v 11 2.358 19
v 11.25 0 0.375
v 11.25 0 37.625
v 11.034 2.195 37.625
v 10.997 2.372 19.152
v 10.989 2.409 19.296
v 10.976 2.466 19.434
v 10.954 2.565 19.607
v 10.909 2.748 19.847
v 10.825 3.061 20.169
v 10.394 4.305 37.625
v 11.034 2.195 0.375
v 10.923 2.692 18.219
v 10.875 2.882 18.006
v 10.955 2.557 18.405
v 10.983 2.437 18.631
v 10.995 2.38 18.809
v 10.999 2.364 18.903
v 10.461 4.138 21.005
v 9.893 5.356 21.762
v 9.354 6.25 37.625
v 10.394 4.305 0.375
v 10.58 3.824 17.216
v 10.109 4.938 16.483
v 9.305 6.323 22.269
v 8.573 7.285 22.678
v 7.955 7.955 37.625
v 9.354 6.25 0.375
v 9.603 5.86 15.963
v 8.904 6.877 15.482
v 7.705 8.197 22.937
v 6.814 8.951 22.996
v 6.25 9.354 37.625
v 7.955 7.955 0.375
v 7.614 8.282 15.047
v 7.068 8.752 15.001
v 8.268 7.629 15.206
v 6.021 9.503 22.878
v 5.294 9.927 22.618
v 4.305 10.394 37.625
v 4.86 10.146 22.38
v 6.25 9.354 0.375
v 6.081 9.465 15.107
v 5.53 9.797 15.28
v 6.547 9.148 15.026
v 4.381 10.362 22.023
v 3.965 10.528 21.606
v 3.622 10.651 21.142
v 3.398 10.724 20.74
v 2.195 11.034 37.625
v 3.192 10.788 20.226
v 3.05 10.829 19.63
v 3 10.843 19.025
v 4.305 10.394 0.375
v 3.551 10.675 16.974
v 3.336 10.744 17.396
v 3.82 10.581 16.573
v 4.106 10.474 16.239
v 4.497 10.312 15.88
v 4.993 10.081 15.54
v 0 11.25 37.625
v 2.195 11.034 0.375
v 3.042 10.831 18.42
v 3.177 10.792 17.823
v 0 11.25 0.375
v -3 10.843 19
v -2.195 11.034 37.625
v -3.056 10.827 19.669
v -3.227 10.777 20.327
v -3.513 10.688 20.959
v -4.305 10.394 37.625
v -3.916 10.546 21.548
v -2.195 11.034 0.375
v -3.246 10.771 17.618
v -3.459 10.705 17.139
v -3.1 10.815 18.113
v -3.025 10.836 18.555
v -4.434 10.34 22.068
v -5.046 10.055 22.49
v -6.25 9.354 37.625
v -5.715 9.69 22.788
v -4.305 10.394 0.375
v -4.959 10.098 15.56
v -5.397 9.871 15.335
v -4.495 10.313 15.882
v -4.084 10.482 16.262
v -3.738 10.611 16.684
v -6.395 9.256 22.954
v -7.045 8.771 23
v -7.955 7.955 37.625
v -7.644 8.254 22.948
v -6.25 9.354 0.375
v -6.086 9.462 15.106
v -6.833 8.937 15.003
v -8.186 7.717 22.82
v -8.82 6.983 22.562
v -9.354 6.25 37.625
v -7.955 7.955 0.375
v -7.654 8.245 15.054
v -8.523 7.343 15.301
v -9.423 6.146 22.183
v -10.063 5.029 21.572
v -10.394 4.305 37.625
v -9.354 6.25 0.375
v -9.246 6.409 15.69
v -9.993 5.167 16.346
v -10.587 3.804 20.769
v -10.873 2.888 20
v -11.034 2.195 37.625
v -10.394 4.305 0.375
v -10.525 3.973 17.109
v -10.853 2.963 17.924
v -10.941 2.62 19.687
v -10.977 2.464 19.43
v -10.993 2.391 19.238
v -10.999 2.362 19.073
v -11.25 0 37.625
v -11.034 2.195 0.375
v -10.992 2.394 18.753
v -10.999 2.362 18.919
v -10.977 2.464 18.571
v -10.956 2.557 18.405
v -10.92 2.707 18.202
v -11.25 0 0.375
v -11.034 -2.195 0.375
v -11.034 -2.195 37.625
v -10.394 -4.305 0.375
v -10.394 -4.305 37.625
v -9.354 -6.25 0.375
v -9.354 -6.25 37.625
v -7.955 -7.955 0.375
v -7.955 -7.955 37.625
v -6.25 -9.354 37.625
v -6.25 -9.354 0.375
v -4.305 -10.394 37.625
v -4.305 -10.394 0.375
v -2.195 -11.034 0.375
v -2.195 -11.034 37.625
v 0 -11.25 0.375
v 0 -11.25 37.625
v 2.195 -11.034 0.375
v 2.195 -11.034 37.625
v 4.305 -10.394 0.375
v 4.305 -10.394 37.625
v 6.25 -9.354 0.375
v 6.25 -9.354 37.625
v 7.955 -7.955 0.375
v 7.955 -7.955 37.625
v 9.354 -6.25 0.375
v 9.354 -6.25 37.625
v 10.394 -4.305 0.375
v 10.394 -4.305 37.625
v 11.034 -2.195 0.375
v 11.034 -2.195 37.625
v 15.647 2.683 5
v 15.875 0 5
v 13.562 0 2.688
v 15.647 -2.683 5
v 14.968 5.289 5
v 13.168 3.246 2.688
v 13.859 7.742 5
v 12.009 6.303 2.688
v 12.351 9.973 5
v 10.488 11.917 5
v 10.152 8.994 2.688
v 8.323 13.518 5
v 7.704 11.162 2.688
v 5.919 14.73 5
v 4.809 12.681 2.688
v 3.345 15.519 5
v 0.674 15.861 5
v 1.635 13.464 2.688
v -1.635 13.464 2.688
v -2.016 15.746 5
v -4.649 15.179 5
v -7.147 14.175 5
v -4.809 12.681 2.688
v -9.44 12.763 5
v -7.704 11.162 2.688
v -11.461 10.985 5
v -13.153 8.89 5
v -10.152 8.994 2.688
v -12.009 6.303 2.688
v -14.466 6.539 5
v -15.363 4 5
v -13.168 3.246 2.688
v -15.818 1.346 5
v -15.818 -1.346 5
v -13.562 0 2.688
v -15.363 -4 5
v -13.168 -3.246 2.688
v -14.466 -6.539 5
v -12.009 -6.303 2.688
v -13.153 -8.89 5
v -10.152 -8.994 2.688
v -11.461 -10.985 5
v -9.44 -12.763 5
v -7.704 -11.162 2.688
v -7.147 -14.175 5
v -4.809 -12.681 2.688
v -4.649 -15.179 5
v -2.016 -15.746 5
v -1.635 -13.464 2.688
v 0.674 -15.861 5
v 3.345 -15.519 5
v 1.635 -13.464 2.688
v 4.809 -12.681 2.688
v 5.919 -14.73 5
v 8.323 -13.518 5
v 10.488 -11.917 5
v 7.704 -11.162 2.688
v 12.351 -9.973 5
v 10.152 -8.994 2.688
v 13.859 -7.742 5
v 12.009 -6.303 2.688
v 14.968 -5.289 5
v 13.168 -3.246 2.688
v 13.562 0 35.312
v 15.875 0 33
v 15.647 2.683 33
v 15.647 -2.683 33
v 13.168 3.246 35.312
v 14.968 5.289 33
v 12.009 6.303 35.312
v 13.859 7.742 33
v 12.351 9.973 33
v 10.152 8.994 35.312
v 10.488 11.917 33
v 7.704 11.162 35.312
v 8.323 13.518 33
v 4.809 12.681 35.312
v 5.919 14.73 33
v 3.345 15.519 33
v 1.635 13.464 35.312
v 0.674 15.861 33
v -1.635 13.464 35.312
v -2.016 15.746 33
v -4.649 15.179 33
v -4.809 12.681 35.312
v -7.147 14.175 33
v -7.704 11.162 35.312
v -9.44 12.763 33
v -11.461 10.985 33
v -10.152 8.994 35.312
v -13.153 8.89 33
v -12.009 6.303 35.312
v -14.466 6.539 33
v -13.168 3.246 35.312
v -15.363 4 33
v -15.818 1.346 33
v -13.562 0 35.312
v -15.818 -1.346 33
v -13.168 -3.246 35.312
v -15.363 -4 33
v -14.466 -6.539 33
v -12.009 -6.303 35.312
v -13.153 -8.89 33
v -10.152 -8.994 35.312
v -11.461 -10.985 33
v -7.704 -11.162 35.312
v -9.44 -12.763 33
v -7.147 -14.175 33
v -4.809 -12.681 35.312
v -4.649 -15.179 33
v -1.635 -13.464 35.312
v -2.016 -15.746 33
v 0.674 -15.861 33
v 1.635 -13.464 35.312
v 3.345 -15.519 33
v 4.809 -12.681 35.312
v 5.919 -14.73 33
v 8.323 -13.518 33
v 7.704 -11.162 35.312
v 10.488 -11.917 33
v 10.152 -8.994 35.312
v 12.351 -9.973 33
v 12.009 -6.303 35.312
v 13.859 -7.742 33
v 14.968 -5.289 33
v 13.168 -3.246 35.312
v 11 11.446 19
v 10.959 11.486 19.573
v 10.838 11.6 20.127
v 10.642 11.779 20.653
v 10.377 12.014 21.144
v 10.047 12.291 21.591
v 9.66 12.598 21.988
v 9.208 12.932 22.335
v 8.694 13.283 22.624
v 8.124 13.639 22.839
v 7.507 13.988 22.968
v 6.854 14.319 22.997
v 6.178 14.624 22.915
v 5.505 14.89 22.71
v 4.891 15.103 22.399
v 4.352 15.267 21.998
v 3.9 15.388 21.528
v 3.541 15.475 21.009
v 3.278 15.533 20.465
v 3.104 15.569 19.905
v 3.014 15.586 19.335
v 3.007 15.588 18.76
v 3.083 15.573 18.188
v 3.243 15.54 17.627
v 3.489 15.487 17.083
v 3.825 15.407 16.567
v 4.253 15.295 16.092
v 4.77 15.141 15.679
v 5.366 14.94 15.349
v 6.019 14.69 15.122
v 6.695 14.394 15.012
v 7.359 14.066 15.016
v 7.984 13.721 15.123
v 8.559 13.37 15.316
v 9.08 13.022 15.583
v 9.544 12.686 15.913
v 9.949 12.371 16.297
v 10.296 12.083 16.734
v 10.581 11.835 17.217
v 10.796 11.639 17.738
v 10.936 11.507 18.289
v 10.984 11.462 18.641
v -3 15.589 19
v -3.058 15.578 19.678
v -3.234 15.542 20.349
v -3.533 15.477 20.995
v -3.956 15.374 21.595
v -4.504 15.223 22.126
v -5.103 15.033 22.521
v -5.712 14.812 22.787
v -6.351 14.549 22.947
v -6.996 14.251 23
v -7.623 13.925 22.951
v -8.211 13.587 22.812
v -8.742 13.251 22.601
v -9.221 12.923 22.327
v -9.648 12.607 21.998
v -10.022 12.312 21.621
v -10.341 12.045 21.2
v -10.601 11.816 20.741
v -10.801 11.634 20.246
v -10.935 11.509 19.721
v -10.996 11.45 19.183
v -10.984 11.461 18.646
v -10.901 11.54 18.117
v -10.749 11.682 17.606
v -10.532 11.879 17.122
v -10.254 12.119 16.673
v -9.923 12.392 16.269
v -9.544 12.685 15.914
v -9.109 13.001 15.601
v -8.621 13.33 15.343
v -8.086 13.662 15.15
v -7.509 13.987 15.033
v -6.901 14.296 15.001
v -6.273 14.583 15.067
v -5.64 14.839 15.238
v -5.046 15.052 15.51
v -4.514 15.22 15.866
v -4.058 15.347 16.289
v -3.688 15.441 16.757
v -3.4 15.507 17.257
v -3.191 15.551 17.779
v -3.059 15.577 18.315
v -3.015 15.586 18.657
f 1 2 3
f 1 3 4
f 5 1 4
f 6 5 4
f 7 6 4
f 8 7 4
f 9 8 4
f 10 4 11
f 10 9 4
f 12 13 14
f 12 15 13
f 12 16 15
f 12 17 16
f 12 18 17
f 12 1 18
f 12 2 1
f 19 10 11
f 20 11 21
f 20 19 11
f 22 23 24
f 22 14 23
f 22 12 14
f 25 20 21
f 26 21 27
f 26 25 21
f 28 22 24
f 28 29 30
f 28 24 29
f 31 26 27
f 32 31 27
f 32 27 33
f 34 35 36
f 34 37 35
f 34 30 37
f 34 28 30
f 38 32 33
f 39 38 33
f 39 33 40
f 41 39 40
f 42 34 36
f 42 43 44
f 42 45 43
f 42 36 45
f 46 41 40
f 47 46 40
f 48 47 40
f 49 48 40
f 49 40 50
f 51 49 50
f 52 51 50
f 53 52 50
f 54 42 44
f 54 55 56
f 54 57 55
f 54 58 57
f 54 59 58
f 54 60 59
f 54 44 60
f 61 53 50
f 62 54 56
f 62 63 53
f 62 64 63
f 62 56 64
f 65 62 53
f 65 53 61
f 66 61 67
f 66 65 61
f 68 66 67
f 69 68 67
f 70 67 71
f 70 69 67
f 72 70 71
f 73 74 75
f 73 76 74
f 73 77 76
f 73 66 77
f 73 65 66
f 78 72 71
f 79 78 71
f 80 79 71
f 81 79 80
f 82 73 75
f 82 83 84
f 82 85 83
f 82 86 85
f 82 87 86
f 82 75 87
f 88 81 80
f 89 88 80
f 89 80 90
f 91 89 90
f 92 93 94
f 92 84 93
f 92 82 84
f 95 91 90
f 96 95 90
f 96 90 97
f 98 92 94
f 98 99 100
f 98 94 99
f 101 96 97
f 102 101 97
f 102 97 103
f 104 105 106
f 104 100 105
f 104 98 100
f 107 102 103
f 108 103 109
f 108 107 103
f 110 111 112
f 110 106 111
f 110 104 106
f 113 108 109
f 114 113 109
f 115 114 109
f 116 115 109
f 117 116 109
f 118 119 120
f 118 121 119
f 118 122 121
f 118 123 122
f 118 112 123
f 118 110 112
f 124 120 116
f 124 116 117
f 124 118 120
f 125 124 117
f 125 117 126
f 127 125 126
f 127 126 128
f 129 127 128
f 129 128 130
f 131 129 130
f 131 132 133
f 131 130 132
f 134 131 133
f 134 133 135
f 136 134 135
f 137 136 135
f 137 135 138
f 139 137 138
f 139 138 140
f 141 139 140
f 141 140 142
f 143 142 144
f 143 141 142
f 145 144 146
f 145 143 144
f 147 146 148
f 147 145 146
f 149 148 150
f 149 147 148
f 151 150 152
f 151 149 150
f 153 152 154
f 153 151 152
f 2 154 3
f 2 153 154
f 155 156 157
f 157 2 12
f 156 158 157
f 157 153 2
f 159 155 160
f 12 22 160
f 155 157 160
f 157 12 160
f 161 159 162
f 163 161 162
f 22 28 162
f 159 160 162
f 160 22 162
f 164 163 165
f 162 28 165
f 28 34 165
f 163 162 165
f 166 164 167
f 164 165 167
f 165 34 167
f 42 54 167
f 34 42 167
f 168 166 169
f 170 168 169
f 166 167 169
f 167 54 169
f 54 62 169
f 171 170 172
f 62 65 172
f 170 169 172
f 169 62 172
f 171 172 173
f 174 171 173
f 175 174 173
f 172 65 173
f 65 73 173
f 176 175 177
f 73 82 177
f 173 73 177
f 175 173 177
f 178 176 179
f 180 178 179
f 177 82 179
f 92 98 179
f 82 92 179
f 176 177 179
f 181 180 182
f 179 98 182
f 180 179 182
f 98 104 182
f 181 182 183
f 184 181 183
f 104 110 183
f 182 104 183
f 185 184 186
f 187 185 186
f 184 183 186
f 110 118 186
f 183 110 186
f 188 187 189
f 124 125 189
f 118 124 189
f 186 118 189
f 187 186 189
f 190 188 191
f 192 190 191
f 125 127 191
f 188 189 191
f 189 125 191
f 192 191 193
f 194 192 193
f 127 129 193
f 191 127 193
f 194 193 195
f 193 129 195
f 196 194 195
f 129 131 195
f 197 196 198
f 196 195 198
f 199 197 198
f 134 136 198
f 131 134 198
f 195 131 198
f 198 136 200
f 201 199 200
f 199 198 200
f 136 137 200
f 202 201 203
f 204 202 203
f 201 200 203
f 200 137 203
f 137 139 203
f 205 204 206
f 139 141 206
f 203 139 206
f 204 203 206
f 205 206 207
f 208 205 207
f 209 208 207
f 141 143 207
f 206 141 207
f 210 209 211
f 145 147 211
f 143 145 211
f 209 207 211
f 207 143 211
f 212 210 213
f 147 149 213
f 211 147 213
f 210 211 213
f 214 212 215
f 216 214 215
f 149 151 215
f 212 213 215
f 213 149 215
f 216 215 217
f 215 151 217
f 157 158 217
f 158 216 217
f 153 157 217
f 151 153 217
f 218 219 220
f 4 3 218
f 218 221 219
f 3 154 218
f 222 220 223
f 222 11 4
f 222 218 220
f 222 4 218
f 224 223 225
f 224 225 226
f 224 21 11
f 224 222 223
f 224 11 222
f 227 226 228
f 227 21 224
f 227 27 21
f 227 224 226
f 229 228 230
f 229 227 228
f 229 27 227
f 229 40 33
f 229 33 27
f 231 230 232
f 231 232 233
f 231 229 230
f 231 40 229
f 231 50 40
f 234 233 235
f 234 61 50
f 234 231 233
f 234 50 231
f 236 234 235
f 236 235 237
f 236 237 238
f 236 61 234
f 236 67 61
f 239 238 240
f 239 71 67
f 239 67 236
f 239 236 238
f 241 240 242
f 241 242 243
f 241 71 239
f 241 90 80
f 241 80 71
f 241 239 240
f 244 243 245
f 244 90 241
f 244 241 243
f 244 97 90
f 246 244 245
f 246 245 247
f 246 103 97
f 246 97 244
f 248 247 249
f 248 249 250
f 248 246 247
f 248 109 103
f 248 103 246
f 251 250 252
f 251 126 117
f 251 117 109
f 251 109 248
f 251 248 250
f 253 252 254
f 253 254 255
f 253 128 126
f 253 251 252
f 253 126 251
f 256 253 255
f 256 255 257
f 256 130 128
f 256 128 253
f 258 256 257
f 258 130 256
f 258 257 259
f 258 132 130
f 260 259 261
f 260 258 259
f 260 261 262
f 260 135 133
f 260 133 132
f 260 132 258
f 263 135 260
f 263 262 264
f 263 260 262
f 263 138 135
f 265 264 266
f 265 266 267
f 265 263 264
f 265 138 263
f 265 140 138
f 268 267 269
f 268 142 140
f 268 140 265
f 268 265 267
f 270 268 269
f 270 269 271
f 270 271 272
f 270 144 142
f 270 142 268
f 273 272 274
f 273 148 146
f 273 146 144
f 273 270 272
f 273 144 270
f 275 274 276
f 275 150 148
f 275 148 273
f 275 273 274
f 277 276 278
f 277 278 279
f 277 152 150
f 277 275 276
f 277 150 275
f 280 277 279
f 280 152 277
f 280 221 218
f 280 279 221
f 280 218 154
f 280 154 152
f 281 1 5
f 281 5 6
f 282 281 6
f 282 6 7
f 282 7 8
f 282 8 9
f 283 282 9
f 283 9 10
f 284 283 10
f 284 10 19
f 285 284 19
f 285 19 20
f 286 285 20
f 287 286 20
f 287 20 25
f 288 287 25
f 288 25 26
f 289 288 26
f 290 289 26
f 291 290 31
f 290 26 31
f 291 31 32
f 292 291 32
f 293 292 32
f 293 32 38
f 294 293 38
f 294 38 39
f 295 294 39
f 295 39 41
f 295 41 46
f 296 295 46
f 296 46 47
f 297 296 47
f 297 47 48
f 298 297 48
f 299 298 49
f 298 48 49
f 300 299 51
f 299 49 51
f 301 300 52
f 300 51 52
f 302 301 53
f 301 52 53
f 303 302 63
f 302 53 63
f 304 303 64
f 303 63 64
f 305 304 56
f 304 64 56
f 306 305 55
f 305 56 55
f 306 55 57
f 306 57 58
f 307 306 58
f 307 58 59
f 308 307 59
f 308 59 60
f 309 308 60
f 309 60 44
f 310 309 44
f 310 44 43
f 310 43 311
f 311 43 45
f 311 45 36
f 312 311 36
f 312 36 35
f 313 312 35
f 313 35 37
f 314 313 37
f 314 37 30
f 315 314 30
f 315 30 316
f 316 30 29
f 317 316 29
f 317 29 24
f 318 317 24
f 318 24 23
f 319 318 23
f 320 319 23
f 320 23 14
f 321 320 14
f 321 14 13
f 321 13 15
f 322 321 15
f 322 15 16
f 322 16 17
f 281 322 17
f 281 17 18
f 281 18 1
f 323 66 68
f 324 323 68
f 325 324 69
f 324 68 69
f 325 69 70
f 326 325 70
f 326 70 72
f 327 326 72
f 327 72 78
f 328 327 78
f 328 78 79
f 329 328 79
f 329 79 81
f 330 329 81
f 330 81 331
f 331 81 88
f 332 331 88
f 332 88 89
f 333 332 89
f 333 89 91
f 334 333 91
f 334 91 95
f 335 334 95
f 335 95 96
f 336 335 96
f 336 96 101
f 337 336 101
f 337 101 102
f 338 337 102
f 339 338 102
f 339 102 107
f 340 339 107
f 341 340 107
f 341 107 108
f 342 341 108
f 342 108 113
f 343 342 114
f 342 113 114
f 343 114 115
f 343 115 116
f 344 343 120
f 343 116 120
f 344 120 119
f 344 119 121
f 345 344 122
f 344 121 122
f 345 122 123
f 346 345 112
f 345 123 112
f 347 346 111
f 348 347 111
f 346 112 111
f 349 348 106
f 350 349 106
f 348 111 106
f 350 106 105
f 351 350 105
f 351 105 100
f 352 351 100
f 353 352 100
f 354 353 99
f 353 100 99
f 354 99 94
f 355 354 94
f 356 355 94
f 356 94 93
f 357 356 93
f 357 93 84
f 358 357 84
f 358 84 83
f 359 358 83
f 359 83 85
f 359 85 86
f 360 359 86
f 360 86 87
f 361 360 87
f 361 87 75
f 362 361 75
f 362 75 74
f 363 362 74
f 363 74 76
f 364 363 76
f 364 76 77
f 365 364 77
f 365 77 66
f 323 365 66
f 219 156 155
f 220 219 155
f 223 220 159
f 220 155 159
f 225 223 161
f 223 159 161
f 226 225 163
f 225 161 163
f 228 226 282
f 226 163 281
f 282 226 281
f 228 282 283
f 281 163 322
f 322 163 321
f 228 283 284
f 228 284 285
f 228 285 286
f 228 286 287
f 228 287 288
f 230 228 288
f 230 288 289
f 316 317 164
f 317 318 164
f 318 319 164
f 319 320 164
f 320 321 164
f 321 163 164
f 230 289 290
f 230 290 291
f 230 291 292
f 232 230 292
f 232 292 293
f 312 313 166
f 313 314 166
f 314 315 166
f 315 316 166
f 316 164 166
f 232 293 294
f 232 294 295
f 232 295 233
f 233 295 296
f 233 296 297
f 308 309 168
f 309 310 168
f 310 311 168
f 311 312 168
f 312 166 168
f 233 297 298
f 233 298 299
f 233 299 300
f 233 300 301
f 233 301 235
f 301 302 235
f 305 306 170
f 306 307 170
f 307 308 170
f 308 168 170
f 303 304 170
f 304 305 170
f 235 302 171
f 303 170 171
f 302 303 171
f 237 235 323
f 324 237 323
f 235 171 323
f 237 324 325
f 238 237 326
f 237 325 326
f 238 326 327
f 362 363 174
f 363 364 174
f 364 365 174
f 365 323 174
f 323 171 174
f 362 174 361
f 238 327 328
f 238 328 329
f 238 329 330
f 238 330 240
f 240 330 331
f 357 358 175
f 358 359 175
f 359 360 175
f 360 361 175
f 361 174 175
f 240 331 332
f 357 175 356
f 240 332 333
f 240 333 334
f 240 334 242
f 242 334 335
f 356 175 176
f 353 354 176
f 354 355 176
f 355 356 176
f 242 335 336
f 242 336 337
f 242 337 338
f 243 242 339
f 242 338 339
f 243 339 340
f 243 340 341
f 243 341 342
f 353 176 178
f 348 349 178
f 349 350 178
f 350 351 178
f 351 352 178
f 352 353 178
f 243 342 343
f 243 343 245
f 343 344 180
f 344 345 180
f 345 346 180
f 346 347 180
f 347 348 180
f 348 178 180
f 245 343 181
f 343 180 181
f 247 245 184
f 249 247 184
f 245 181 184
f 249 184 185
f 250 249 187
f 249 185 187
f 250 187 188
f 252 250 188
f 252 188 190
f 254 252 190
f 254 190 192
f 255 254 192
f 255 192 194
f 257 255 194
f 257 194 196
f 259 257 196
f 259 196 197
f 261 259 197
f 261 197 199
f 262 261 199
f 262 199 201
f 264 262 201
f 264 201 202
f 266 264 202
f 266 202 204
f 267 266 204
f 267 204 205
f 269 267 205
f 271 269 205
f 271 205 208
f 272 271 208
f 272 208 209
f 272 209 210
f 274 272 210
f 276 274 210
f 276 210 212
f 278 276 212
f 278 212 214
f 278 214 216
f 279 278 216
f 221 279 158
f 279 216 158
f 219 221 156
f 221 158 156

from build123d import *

# Parameters (mm, degrees)
F0_R     = 15.875
F0_R_2   = 11.25
F1_DEPTH = 38
F2_R     = 4
F4_DEPTH = 15.876


# Not quite as in the source:
# - a fillet or chamfer that OpenCascade refuses, or shapes differently, is made with other operations: its cross-section is extruded or revolved along the edge and cut away or added


with BuildPart() as f1:
    # F0 (on Top) → F1 (new body)
    with BuildSketch(Plane.XY):
        Circle(F0_R)
        Circle(F0_R_2, mode=Mode.SUBTRACT)
    extrude(amount=F1_DEPTH)

    # F3: chamfer of 5 on 2 edges, made by hand

    # F3_s1 → F3_t2 (revolve, cut)
    with BuildSketch(Plane.XZ):
        Polygon((15.875, 33), (10.875, 38), (15.875, 38), align=None)
    revolve(axis=Axis((0, 0, 38), (0, 0, 1)), mode=Mode.SUBTRACT)

    # F3_s3 → F3_t4 (revolve, cut)
    with BuildSketch(Plane.XZ):
        Polygon((15.875, 5), (10.875, 0), (15.875, 0), align=None)
    revolve(axis=Axis((0, 0, 0), (0, 0, 1)), mode=Mode.SUBTRACT)

    # F2 (on Front) → F4 (cut, through all)
    with BuildSketch(Plane.XZ):
        with Locations((7, 19)):
            Circle(F2_R)
        with Locations((-7, 19)):
            Circle(F2_R)
    extrude(amount=-F4_DEPTH, mode=Mode.SUBTRACT)


solid = f1.part
